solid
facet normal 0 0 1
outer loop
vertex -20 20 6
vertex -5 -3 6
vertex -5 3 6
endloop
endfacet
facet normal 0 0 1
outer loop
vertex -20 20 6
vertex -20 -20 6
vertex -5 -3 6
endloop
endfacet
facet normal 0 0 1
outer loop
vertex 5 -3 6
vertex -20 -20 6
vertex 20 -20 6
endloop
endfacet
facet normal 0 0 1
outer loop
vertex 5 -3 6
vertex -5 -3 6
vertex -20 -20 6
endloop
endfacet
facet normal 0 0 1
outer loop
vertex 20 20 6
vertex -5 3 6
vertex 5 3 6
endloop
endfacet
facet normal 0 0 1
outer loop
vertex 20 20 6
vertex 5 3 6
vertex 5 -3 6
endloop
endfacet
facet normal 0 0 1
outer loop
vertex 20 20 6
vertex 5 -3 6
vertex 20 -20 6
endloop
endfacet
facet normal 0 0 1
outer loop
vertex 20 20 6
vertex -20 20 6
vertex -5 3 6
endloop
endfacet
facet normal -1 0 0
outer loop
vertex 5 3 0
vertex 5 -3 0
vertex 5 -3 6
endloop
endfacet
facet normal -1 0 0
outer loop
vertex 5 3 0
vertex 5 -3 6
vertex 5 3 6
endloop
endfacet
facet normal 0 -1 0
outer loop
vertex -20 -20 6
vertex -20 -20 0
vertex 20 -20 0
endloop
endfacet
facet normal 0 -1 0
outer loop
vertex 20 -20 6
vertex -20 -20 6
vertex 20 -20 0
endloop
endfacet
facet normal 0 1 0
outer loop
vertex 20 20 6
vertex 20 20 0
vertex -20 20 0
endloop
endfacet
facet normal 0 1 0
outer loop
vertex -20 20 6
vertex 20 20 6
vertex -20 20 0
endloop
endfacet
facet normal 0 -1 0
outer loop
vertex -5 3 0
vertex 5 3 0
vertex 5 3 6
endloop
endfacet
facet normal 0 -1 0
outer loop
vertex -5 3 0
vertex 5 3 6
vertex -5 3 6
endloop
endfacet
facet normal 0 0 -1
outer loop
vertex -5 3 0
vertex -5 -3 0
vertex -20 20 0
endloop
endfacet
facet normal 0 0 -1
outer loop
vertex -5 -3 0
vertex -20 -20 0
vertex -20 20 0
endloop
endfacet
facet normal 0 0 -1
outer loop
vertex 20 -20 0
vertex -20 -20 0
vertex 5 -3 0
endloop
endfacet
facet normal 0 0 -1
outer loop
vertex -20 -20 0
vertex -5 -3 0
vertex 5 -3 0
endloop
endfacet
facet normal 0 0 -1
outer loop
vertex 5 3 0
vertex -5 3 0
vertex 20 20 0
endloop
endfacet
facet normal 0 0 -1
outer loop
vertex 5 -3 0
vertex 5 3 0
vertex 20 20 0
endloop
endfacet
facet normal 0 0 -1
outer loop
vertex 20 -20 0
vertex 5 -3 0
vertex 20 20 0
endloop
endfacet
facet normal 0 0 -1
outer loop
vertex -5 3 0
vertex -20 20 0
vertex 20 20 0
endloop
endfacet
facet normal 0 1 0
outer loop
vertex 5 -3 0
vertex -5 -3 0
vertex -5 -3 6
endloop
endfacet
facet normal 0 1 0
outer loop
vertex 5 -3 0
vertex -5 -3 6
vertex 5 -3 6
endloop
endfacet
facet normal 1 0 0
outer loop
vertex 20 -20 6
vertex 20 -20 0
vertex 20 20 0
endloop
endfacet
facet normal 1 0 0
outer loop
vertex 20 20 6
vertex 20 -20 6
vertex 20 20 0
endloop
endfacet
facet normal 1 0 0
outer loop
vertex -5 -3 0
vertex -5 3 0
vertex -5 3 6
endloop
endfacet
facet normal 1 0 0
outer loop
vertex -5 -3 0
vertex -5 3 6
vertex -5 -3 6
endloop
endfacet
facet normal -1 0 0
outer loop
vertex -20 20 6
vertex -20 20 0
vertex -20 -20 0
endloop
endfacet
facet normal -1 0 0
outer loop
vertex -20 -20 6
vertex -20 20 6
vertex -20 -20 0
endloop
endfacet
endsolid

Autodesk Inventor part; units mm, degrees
ref_plane "YZ Plane" through (0, 0, 0) normal (1, 0, 0) x (0, 1, 0)
ref_plane "XZ Plane" through (0, 0, 0) normal (0, 1, 0) x (-1, 0, 0)
ref_plane "XY Plane" through (0, 0, 0) normal (0, 0, 1) x (1, 0, 0)
sketch "Sketch1" plane through (0, 0, 0) normal (0, 0, 1) x (1, 0, 0)
  line L0 (-20, -20) -> (20, -20)
  line L1 (20, -20) -> (20, 20)
  line L2 (20, 20) -> (-20, 20)
  line L3 (-20, 20) -> (-20, -20)
  line L4 (-20, -20) -> (20, 20) construction
  line L5 (20, -20) -> (-20, 20) construction
  line L6 (-5, -3) -> (5, -3)
  line L7 (5, -3) -> (5, 3)
  line L8 (5, 3) -> (-5, 3)
  line L9 (-5, 3) -> (-5, -3)
  line L10 (-5, -3) -> (5, 3) construction
  line L11 (5, -3) -> (-5, 3) construction
  point P0 (0, 0)
  dimension "d2" = 40
  dimension "d3" = 40
  dimension "d6" = 10
  dimension "d7" = 6
extrude "Extrusion1" add sketch "Sketch1" along normal blind 6 contours L3 L2 L1 L0 | L9 L8 L7 L6
extrude "Extrusion2" cut sketch "Sketch1" along normal through all contours L9 L8 L7 L6
properties part number "Push_1"
